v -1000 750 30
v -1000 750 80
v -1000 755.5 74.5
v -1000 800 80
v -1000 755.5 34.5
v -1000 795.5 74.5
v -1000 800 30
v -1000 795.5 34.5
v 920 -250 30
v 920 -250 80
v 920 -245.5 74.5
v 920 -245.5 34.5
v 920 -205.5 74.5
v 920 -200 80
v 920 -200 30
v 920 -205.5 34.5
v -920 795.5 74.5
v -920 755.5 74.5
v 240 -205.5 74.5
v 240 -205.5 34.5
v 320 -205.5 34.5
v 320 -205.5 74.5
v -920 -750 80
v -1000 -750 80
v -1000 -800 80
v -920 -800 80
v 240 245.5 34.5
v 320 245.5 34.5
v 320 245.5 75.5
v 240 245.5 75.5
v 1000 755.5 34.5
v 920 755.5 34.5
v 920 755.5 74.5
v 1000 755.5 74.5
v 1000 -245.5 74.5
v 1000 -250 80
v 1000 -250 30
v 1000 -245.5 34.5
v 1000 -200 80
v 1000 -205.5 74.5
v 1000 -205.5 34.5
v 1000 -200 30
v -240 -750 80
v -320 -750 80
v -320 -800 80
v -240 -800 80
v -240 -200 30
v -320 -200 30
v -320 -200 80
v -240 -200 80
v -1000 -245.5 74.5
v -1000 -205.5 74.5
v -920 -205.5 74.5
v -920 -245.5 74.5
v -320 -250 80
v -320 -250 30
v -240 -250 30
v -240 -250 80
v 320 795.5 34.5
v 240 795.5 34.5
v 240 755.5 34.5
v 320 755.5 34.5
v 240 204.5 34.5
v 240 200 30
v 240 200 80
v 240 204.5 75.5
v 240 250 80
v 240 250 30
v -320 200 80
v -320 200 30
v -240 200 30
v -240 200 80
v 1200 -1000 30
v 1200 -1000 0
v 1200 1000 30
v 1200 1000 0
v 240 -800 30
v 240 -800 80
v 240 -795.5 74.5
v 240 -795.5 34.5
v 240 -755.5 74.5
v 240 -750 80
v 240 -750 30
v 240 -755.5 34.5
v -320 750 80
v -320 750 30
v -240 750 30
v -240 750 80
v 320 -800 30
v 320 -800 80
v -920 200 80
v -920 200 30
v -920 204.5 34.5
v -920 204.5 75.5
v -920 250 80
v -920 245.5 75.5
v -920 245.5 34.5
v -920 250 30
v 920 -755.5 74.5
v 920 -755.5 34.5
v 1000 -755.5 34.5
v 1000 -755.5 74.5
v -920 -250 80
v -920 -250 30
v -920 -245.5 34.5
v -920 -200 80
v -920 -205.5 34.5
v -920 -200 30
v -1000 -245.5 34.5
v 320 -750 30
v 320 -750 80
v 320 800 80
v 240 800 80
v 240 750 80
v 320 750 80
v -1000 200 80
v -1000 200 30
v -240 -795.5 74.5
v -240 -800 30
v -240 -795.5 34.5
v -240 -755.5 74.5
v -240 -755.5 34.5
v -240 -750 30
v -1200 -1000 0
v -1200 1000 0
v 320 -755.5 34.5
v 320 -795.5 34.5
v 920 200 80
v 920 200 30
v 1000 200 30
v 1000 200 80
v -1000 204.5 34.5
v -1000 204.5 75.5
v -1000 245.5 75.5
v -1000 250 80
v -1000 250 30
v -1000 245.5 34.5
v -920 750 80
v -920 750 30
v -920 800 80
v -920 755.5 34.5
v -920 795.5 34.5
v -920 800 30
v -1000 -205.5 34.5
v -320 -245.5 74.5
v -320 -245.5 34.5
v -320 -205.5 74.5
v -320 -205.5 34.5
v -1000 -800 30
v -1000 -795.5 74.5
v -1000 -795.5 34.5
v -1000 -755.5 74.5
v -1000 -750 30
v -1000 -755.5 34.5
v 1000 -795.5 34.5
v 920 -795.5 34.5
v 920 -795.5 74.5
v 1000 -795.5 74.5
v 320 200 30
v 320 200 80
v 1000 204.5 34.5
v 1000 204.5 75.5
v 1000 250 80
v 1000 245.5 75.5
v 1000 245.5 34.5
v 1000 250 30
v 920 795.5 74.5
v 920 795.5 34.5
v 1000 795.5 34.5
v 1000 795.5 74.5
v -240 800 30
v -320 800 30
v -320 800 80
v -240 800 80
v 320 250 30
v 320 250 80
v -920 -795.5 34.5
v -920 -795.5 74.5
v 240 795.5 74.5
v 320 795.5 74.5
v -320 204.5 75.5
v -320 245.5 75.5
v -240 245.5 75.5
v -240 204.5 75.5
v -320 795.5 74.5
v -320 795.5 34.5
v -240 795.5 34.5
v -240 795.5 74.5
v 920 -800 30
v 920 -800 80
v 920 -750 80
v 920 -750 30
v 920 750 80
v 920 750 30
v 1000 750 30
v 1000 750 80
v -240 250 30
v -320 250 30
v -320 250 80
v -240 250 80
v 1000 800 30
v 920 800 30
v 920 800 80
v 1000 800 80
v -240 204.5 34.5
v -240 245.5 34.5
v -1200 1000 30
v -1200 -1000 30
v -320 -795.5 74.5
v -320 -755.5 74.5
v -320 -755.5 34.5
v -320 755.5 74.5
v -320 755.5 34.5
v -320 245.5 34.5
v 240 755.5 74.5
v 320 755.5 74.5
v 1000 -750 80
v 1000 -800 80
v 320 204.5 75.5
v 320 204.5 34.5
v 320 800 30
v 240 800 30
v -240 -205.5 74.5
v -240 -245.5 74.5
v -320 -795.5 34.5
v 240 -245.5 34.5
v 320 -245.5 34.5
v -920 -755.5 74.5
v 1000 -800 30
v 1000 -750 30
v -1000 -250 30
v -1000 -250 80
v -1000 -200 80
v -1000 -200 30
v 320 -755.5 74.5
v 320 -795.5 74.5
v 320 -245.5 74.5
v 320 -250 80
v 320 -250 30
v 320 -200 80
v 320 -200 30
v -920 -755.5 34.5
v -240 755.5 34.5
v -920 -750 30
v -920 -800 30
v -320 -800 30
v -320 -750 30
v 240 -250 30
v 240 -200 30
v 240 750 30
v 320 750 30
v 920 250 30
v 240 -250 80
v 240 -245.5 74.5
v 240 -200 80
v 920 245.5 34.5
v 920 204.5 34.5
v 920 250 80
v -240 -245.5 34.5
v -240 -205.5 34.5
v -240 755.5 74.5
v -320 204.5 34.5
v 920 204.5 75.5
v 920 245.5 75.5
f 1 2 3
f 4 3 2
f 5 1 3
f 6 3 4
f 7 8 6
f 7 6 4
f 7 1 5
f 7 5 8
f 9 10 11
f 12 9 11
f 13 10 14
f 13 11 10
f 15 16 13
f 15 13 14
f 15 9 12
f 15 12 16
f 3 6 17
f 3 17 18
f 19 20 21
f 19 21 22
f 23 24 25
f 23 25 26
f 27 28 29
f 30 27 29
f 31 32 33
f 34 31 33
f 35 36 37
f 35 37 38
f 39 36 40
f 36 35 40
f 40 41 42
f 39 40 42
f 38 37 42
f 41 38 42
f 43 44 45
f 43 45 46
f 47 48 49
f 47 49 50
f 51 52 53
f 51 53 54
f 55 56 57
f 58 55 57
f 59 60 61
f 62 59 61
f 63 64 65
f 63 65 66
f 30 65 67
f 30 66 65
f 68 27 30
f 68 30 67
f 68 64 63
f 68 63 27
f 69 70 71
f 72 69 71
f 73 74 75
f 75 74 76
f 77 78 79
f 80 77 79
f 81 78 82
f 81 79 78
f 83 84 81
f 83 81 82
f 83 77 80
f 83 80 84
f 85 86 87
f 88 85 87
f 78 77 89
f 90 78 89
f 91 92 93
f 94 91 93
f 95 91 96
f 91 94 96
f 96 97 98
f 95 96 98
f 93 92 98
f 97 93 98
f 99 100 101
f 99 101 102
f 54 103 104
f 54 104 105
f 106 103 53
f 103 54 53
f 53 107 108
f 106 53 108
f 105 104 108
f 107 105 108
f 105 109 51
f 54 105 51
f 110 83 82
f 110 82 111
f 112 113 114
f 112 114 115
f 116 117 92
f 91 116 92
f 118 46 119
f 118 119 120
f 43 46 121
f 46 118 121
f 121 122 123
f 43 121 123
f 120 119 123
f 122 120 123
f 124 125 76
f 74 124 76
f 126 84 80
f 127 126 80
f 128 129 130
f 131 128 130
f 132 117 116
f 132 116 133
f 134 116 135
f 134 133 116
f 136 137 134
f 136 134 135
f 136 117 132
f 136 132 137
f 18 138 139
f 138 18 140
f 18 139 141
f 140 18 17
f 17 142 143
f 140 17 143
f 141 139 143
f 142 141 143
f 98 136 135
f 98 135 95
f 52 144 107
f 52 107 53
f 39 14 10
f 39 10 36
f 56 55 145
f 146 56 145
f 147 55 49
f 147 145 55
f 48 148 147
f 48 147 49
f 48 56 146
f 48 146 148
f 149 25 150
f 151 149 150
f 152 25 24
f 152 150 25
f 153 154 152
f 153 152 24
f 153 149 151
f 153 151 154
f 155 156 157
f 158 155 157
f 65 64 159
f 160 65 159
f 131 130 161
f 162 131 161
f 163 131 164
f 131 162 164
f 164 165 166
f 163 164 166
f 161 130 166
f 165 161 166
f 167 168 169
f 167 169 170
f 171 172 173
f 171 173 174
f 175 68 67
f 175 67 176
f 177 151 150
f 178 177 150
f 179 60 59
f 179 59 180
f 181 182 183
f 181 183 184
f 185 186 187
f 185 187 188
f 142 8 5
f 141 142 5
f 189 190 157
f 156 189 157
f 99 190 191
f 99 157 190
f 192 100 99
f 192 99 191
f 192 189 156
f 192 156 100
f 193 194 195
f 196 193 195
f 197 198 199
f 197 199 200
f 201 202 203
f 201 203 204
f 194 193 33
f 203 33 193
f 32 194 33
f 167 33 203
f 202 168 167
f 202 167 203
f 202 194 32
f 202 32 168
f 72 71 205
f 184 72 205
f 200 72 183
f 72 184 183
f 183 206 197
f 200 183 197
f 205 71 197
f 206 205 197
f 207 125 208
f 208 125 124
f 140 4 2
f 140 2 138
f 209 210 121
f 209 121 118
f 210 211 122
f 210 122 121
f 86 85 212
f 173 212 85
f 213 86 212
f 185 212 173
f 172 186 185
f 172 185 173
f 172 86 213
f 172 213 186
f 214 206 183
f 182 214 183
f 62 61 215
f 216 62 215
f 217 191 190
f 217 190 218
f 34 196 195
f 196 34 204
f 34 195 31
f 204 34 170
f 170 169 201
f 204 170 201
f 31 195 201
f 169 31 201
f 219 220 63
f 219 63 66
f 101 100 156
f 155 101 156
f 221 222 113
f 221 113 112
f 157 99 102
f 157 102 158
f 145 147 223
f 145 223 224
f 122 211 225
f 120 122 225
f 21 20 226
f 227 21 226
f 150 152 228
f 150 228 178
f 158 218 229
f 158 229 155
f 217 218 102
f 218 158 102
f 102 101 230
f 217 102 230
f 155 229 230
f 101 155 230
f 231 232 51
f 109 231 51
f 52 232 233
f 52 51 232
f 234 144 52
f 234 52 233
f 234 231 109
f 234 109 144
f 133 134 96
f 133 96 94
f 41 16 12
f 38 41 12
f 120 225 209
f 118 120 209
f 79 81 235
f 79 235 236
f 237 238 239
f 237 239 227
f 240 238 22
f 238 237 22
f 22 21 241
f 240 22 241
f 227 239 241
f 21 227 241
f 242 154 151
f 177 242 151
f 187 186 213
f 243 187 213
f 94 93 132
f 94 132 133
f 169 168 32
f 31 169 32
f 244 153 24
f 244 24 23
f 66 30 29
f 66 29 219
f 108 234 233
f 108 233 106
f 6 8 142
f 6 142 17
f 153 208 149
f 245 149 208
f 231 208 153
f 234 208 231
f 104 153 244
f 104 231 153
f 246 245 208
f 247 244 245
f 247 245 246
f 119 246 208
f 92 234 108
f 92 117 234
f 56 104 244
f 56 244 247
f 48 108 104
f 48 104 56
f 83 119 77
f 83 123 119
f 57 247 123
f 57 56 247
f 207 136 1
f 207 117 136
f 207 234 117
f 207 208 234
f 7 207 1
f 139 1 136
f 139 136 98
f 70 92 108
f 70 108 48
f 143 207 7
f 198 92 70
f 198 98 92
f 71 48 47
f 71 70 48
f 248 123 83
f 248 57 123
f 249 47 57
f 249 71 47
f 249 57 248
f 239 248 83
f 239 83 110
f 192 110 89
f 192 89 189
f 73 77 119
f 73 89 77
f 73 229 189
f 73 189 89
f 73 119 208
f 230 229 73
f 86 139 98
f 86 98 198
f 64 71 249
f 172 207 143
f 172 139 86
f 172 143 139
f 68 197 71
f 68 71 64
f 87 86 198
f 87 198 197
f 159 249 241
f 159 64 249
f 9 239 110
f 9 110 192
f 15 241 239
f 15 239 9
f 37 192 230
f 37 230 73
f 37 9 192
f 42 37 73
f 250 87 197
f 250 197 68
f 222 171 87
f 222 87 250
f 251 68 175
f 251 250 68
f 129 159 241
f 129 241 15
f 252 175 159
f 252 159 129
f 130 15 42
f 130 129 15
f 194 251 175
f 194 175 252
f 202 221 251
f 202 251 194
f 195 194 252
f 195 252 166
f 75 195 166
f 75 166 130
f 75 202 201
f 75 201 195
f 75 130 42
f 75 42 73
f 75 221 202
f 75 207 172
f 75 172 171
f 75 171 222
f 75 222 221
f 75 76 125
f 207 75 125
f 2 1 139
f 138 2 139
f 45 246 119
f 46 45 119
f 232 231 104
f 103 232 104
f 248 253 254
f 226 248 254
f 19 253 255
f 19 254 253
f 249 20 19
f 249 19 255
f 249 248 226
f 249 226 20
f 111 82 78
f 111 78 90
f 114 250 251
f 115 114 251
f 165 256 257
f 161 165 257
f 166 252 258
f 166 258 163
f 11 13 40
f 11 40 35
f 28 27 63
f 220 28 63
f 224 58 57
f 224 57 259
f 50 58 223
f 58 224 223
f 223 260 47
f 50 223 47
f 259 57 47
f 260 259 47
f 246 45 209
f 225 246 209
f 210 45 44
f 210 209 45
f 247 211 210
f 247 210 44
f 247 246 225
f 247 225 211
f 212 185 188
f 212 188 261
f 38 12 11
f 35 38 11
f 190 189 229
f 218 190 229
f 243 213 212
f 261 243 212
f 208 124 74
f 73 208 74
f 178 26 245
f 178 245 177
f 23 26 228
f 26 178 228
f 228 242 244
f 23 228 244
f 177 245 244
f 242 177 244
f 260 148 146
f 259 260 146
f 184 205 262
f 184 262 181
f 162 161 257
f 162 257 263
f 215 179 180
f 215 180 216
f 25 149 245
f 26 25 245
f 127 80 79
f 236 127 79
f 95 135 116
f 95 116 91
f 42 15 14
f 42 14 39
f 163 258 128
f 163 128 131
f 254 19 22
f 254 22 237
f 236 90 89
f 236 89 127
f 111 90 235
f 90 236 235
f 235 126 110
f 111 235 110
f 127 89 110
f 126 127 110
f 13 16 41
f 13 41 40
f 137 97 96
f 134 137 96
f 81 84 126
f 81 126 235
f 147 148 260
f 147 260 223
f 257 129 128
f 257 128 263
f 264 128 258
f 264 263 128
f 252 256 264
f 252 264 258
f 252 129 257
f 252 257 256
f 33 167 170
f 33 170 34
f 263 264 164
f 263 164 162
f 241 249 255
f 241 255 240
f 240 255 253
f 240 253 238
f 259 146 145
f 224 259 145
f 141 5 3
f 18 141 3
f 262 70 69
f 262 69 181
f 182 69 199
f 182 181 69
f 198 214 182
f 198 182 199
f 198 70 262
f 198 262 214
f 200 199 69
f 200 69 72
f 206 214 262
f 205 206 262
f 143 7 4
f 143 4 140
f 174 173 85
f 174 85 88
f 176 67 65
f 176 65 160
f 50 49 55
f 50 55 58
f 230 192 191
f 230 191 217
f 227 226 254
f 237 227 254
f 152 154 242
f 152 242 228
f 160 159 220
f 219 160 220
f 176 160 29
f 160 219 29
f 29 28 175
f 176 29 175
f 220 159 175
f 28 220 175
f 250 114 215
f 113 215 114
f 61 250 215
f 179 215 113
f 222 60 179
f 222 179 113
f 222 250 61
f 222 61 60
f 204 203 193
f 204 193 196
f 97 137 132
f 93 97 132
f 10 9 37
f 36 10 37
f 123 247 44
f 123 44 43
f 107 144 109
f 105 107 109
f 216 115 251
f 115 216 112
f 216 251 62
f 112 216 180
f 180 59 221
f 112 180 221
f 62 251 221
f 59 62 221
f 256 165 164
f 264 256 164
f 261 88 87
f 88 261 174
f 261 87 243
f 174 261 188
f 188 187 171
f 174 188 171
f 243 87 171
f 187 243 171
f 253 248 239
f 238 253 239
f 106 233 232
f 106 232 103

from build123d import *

# Parameters (mm, degrees)
F0_W     = 1200
F0_H     = 1000
F1_DEPTH = 30
F2_W     = 80
F2_H     = 50
F3_DEPTH = 50
F4_W     = 41
F4_H     = 41
F4_W_2   = 40
F4_H_2   = 40
F5_DEPTH = 2200


with BuildPart() as f1:
    # F0 (on Top) → F1 (new body)
    with BuildSketch(Plane.XY):
        with Locations((-600, 500)):
            Rectangle(F0_W, F0_H)
        with Locations((600, 500)):
            Rectangle(F0_W, F0_H)
        with Locations((600, -500)):
            Rectangle(F0_W, F0_H)
        with Locations((-600, -500)):
            Rectangle(F0_W, F0_H)
    extrude(amount=F1_DEPTH)

    # F2 (on face) → F3 (join)
    with BuildSketch(Plane.XY.offset(30)):
        with Locations((-960, 775)):
            Rectangle(F2_W, F2_H)
        with Locations((-280, 775)):
            Rectangle(F2_W, F2_H)
        with Locations((280, 775)):
            Rectangle(F2_W, F2_H)
        with Locations((960, 775)):
            Rectangle(F2_W, F2_H)
        with Locations((-960, -775)):
            Rectangle(F2_W, F2_H)
        with Locations((-280, -775)):
            Rectangle(F2_W, F2_H)
        with Locations((280, -775)):
            Rectangle(F2_W, F2_H)
        with Locations((960, -775)):
            Rectangle(F2_W, F2_H)
        with Locations((-960, 225)):
            Rectangle(F2_W, F2_H)
        with Locations((-280, 225)):
            Rectangle(F2_W, F2_H)
        with Locations((280, 225)):
            Rectangle(F2_W, F2_H)
        with Locations((960, 225)):
            Rectangle(F2_W, F2_H)
        with Locations((-960, -225)):
            Rectangle(F2_W, F2_H)
        with Locations((-280, -225)):
            Rectangle(F2_W, F2_H)
        with Locations((280, -225)):
            Rectangle(F2_W, F2_H)
        with Locations((960, -225)):
            Rectangle(F2_W, F2_H)
    extrude(amount=F3_DEPTH)

    # F4 (on face) → F5 (cut)
    with BuildSketch(Plane(origin=(-1000, 0, 0), x_dir=(0, -1, 0), z_dir=(-1, 0, 0))):
        with Locations((-225, 55)):
            Rectangle(F4_W, F4_H)
        with Locations((-775.5, 54.5)):
            Rectangle(F4_W_2, F4_H_2)
        with Locations((225.5, 54.5)):
            Rectangle(F4_W_2, F4_H_2)
        with Locations((775.5, 54.5)):
            Rectangle(F4_W_2, F4_H_2)
    extrude(amount=-F5_DEPTH, mode=Mode.SUBTRACT)


solid = f1.part
